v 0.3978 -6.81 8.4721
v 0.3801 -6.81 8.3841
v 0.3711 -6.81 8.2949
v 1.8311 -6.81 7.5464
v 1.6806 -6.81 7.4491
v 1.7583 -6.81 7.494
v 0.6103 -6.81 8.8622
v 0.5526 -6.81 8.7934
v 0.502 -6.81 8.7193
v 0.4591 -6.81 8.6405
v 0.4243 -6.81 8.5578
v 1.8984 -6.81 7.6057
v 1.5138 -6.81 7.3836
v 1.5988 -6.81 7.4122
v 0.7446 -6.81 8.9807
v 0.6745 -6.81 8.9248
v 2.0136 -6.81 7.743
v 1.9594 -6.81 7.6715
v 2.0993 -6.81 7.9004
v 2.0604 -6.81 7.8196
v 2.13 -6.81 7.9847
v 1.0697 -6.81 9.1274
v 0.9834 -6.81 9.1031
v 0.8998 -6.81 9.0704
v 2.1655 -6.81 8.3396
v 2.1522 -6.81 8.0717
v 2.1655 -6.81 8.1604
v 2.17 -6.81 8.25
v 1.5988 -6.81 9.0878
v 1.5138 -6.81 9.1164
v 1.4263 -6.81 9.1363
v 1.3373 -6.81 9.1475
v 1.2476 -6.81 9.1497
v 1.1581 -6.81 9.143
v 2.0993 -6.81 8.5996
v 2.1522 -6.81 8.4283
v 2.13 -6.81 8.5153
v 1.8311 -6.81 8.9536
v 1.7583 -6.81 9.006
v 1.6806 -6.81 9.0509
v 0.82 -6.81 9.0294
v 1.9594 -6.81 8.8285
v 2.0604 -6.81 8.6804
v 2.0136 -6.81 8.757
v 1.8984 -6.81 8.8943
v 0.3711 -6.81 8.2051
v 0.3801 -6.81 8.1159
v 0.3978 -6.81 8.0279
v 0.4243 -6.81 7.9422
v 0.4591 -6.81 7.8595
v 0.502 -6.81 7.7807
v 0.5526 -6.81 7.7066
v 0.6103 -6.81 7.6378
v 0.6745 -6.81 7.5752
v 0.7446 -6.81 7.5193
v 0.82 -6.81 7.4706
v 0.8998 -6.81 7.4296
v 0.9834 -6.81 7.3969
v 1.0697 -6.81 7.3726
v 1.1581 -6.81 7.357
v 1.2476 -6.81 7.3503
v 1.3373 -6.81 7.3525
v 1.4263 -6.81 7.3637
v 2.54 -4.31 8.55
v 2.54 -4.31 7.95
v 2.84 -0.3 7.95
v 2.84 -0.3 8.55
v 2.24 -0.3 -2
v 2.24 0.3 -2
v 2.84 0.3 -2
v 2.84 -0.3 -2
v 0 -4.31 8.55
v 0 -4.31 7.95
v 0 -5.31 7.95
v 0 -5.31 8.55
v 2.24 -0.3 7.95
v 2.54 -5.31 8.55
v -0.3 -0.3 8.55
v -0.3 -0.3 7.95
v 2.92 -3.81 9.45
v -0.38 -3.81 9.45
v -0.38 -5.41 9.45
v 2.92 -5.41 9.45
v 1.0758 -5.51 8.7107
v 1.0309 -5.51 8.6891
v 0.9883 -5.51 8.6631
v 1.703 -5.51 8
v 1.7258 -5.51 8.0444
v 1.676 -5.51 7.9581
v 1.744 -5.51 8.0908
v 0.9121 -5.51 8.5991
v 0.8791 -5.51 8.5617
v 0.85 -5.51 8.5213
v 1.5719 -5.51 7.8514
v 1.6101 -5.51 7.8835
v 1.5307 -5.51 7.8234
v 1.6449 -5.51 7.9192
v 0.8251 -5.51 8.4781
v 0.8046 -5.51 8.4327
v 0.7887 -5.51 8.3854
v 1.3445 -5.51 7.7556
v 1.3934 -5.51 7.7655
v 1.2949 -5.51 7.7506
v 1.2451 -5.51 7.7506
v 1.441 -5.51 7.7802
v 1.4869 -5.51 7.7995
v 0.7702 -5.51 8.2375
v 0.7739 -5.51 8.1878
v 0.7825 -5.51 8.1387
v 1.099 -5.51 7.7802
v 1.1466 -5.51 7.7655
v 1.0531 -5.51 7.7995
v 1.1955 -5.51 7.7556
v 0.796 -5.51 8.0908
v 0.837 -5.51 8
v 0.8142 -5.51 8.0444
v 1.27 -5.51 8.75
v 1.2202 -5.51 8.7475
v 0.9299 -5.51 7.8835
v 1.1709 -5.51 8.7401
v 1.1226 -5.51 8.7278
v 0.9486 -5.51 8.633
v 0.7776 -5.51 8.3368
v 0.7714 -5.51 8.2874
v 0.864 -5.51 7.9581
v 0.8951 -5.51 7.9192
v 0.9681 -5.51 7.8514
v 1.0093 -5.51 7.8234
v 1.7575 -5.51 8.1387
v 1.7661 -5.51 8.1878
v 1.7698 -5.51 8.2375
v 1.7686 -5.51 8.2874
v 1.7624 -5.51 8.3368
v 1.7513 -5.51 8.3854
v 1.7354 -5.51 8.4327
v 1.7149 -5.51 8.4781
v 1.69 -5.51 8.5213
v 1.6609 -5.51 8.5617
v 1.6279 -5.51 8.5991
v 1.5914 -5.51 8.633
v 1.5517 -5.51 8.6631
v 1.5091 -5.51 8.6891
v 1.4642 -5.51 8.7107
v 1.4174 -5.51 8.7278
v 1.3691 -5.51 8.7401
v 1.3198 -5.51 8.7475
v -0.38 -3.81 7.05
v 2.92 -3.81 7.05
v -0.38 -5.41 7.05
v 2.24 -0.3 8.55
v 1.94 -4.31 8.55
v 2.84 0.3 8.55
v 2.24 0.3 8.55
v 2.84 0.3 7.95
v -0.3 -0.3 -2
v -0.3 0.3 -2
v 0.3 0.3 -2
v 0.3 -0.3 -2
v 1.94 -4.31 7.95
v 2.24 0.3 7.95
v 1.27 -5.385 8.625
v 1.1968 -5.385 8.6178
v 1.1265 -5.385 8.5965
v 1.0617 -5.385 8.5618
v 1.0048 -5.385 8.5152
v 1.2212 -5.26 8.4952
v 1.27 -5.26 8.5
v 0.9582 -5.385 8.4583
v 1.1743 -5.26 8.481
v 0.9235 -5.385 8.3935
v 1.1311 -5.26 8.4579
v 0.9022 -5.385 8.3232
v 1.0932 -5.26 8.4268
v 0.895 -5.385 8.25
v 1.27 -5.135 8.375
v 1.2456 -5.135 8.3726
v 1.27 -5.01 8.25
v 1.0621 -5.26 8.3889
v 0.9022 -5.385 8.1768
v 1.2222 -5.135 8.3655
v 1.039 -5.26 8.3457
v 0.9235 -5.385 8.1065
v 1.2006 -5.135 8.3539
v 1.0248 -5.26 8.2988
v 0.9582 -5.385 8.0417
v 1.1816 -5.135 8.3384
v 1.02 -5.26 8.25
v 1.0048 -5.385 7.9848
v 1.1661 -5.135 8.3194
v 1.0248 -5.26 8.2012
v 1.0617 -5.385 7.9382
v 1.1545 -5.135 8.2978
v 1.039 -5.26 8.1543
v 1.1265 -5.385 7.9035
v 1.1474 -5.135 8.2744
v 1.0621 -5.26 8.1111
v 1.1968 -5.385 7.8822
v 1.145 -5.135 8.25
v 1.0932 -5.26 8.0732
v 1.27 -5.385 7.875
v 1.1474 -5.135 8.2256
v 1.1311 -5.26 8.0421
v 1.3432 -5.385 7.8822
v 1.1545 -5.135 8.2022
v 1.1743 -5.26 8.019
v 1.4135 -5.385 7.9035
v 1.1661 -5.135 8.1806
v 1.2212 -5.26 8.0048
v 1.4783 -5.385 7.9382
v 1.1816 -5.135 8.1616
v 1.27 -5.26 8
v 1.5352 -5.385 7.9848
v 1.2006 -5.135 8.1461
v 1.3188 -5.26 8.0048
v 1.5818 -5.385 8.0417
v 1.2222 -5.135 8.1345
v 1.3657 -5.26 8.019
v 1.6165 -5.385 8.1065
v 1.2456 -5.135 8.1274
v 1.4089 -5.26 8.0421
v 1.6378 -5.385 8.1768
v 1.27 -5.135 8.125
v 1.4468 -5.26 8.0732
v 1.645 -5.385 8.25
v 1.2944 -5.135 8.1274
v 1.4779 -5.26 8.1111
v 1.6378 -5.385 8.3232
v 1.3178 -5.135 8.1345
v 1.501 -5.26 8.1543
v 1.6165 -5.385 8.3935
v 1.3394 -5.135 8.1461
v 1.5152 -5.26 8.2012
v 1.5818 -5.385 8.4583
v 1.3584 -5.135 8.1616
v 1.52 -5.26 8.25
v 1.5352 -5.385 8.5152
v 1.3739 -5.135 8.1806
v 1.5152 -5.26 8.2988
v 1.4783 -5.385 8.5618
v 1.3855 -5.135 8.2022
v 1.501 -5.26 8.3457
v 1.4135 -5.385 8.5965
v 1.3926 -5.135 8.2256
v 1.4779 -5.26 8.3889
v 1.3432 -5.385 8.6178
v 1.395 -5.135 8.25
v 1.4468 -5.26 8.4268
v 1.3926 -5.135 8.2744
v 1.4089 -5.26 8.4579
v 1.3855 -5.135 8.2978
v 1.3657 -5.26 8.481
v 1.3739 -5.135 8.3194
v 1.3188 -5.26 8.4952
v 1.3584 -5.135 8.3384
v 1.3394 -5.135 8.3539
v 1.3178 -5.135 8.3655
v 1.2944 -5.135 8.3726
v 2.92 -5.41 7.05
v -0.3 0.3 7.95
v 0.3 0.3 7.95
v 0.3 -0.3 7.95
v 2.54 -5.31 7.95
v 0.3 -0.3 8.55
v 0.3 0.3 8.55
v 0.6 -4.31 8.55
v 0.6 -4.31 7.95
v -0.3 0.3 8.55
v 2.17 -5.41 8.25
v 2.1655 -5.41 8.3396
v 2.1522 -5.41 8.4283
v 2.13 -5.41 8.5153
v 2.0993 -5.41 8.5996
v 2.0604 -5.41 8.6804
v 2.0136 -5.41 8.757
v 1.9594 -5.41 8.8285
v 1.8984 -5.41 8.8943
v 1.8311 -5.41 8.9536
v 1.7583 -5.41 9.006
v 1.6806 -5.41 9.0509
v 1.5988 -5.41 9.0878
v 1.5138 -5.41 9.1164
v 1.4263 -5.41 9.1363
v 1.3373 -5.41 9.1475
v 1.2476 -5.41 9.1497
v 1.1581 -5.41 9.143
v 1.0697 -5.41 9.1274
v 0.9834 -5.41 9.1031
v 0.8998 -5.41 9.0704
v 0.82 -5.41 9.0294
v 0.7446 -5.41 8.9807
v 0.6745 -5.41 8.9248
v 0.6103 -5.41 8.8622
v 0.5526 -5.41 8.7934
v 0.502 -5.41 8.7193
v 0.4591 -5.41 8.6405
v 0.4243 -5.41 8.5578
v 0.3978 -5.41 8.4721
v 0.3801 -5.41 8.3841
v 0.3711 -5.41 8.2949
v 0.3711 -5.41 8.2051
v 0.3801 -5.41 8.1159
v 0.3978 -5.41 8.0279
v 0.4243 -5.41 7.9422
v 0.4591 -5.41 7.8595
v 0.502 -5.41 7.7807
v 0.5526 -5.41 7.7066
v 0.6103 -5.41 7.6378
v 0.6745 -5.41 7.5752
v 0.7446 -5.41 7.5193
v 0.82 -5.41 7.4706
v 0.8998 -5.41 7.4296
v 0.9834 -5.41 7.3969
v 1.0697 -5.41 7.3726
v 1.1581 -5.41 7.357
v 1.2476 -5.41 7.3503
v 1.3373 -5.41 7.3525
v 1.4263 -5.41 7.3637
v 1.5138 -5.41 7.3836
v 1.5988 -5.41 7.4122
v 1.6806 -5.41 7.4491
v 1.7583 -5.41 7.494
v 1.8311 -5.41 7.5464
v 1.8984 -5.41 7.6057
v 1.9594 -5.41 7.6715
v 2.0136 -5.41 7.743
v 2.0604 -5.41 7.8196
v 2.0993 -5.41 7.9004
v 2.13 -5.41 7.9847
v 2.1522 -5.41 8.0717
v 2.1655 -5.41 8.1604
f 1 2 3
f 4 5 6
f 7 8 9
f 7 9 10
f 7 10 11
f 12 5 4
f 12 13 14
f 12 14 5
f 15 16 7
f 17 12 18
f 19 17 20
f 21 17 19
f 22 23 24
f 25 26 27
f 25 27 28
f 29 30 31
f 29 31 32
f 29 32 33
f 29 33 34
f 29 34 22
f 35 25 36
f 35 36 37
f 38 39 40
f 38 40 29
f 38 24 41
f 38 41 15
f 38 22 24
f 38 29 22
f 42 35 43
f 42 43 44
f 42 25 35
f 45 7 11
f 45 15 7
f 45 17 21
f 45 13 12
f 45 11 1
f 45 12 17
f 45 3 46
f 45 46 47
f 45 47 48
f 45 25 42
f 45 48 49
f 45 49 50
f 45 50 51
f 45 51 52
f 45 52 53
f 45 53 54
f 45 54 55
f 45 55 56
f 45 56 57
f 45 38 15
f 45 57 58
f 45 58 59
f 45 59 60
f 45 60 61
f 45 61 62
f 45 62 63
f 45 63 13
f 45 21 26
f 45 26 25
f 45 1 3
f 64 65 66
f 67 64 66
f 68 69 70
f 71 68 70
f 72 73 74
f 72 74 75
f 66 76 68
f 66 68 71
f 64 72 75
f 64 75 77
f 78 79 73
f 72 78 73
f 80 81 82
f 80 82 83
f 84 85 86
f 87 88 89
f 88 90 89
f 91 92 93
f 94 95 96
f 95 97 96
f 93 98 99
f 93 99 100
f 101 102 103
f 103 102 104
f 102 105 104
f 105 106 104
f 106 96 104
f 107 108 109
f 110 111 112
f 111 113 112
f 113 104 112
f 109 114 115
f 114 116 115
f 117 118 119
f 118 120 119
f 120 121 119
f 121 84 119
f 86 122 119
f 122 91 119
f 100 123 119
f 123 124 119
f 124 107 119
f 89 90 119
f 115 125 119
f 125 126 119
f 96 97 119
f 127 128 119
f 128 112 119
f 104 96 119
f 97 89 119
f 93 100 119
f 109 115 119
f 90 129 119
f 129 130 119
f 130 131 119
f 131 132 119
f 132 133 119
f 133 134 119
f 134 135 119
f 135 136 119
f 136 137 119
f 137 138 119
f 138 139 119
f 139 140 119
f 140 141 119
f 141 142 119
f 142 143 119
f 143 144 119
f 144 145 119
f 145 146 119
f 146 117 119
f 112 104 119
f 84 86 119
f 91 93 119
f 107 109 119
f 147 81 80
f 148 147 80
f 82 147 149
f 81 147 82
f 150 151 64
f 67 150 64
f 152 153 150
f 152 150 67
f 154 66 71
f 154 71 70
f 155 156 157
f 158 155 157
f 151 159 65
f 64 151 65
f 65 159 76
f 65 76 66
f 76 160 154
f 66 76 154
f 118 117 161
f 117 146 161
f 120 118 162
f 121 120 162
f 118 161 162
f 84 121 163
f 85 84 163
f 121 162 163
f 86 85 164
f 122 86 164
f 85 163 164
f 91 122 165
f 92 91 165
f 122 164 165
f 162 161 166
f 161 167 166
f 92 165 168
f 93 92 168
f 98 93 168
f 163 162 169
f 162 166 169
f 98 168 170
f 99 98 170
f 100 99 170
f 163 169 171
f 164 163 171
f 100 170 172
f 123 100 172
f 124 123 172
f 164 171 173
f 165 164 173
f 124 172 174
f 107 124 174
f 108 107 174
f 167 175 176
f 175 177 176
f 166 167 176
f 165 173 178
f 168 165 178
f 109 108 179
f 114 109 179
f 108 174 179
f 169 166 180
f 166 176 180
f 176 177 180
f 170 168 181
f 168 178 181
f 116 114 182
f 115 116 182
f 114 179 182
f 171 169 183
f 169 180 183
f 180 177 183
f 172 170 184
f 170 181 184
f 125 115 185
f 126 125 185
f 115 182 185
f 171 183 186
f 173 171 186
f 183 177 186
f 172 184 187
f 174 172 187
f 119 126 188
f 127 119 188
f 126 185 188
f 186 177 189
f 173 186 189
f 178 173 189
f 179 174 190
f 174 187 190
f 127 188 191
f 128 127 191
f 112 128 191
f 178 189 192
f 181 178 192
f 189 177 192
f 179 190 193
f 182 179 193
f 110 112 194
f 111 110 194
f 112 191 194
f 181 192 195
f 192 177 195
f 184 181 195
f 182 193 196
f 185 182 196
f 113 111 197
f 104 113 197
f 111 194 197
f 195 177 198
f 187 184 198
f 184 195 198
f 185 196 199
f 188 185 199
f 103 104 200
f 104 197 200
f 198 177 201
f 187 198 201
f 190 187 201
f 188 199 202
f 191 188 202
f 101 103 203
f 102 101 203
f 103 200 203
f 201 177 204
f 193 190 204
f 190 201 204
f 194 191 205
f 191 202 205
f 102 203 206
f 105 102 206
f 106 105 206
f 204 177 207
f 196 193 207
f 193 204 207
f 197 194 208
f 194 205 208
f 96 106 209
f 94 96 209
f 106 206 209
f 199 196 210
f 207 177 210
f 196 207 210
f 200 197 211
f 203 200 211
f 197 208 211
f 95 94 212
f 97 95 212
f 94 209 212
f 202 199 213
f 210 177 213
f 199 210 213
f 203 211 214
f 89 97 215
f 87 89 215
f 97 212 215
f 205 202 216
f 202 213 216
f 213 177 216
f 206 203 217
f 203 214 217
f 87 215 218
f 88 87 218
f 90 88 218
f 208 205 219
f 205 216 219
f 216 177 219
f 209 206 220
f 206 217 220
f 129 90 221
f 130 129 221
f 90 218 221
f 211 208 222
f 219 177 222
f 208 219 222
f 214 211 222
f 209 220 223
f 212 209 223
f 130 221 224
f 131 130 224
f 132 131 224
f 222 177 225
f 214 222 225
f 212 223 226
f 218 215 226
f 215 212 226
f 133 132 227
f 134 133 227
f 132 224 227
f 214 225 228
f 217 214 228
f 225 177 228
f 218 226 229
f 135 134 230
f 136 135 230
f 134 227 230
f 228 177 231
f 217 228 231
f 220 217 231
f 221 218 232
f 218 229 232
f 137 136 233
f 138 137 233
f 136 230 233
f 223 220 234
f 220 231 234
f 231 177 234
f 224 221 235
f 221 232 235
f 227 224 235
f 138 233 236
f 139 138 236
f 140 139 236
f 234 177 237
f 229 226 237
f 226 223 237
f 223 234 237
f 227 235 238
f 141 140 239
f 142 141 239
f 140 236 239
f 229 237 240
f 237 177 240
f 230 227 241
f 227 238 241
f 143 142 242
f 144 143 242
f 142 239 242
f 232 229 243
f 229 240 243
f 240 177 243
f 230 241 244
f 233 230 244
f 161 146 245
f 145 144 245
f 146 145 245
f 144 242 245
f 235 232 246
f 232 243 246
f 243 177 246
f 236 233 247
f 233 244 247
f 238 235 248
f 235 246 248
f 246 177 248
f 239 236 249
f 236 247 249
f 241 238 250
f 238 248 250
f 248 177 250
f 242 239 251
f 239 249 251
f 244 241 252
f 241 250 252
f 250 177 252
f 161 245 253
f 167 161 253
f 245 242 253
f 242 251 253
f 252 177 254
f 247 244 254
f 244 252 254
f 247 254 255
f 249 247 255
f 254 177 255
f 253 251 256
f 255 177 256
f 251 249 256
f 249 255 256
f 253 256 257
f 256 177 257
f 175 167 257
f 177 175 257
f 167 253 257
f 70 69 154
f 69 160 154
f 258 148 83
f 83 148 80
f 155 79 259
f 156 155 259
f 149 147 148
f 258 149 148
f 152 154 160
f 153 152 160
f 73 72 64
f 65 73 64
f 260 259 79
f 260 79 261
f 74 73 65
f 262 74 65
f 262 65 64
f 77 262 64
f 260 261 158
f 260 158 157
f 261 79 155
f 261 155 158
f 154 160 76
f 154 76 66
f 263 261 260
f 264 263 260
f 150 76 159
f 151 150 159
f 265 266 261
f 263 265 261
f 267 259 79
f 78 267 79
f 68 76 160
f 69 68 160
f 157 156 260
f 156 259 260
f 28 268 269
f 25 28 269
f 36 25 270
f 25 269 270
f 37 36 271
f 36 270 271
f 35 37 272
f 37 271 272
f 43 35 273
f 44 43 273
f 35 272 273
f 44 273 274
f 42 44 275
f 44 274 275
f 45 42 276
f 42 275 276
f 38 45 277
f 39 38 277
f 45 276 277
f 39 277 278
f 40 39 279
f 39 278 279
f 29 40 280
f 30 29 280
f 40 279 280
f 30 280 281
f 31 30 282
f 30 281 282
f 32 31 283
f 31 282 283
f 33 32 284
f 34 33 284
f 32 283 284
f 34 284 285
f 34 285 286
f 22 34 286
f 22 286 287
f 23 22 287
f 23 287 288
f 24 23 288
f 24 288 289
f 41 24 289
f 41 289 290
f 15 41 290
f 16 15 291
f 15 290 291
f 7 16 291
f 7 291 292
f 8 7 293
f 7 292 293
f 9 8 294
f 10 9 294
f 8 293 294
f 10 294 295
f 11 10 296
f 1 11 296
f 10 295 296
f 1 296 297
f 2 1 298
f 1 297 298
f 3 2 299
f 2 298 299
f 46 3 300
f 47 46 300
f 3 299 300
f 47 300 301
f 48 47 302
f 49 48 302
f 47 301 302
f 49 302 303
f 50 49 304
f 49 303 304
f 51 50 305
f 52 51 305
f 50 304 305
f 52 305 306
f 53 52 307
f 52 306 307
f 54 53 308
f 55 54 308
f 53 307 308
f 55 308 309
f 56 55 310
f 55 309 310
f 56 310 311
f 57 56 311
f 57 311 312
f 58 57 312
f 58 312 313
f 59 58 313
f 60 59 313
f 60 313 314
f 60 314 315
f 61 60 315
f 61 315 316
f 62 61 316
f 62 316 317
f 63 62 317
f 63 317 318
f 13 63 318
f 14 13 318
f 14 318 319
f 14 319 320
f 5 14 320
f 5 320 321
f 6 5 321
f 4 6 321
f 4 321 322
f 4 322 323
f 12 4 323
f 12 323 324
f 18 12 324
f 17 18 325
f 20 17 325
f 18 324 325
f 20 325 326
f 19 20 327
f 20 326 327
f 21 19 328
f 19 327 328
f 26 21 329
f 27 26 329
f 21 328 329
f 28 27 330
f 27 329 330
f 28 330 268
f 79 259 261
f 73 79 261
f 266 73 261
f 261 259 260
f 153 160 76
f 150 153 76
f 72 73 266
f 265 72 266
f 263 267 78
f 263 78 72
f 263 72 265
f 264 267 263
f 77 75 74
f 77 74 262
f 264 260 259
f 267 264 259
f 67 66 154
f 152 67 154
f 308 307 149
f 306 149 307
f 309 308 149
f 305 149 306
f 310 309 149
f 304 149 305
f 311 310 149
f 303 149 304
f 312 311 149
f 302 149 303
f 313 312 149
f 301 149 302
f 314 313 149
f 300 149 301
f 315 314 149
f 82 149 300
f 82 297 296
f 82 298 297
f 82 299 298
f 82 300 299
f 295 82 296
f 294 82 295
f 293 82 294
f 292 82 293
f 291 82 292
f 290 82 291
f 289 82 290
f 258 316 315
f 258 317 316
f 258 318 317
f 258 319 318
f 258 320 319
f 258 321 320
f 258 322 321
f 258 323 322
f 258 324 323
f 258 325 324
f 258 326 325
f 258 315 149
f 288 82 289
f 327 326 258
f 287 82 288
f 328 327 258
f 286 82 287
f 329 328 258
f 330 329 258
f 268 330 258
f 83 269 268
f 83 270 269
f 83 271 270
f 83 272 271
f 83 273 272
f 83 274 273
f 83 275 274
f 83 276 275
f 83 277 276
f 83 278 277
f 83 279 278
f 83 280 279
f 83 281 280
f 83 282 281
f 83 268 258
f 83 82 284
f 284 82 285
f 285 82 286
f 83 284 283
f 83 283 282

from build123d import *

# Parameters (mm, degrees)
SKETCH_W       = 0.6
SKETCH_H       = 0.6
PAD_DEPTH      = 7.95
PAD_DEPTH_BACK = 2
PAD001_DEPTH   = 0.6
SKETCH002_W    = 2.54
SKETCH002_H    = 0.6
PAD002_DEPTH   = 1
SKETCH004_W    = 3.3
SKETCH004_H    = 2.4
PAD003_DEPTH   = 1.6
SKETCH006_R    = 0.9
PAD004_DEPTH   = 1.4


with BuildPart() as pad:
    # Sketch → Pad (new body, two sides)
    with BuildSketch(Plane.XY) as pad_sk:
        Rectangle(SKETCH_W, SKETCH_H)
        with Locations((2.54, 0)):
            Rectangle(SKETCH_W, SKETCH_H)
    extrude(amount=PAD_DEPTH)
    extrude(pad_sk.sketch, amount=-PAD_DEPTH_BACK)


with BuildPart() as pad001:
    # Sketch001 → Pad001 (new body)
    with BuildSketch(Plane.XY.offset(7.95)):
        Polygon((0.3, 0.3), (-0.3, 0.3), (-0.3, -0.3), (0, -4.31), (0.6, -4.31), (0.3, -0.3), align=None)
        Polygon((2.84, 0.3), (2.24, 0.3), (2.24, -0.3), (1.94, -4.31), (2.54, -4.31), (2.84, -0.3), align=None)
    extrude(amount=PAD001_DEPTH)


with BuildPart() as pad002:
    # Sketch002 → Pad002 (new body)
    with BuildSketch(Plane.XZ.offset(4.31)):
        with Locations((1.27, 8.25)):
            Rectangle(SKETCH002_W, SKETCH002_H)
    extrude(amount=PAD002_DEPTH)


with BuildPart() as revolution001:
    # Sketch005 → Revolution001 (revolve)
    with BuildSketch(Plane.YZ.offset(1.27)):
        Polygon((-5.01, 8.25), (-5.51, 8.25), (-5.51, 8.75), align=None)
    revolve(axis=Axis((1.27, -3.977201, 8.25), (0, -1, 0)))


with BuildPart() as pad004:
    # Sketch004 → Pad003 (new body)
    with BuildSketch(Plane.XZ.offset(3.81)):
        with Locations((1.27, 8.25)):
            Rectangle(SKETCH004_W, SKETCH004_H)
    extrude(amount=PAD003_DEPTH)

    # Sketch006 → Pad004 (new body)
    with BuildSketch(Plane.XZ.offset(5.41)):
        with Locations((1.27, 8.25)):
            Circle(SKETCH006_R)
    extrude(amount=PAD004_DEPTH)


solid = Compound([pad.part, pad001.part, pad002.part, revolution001.part, pad004.part])
